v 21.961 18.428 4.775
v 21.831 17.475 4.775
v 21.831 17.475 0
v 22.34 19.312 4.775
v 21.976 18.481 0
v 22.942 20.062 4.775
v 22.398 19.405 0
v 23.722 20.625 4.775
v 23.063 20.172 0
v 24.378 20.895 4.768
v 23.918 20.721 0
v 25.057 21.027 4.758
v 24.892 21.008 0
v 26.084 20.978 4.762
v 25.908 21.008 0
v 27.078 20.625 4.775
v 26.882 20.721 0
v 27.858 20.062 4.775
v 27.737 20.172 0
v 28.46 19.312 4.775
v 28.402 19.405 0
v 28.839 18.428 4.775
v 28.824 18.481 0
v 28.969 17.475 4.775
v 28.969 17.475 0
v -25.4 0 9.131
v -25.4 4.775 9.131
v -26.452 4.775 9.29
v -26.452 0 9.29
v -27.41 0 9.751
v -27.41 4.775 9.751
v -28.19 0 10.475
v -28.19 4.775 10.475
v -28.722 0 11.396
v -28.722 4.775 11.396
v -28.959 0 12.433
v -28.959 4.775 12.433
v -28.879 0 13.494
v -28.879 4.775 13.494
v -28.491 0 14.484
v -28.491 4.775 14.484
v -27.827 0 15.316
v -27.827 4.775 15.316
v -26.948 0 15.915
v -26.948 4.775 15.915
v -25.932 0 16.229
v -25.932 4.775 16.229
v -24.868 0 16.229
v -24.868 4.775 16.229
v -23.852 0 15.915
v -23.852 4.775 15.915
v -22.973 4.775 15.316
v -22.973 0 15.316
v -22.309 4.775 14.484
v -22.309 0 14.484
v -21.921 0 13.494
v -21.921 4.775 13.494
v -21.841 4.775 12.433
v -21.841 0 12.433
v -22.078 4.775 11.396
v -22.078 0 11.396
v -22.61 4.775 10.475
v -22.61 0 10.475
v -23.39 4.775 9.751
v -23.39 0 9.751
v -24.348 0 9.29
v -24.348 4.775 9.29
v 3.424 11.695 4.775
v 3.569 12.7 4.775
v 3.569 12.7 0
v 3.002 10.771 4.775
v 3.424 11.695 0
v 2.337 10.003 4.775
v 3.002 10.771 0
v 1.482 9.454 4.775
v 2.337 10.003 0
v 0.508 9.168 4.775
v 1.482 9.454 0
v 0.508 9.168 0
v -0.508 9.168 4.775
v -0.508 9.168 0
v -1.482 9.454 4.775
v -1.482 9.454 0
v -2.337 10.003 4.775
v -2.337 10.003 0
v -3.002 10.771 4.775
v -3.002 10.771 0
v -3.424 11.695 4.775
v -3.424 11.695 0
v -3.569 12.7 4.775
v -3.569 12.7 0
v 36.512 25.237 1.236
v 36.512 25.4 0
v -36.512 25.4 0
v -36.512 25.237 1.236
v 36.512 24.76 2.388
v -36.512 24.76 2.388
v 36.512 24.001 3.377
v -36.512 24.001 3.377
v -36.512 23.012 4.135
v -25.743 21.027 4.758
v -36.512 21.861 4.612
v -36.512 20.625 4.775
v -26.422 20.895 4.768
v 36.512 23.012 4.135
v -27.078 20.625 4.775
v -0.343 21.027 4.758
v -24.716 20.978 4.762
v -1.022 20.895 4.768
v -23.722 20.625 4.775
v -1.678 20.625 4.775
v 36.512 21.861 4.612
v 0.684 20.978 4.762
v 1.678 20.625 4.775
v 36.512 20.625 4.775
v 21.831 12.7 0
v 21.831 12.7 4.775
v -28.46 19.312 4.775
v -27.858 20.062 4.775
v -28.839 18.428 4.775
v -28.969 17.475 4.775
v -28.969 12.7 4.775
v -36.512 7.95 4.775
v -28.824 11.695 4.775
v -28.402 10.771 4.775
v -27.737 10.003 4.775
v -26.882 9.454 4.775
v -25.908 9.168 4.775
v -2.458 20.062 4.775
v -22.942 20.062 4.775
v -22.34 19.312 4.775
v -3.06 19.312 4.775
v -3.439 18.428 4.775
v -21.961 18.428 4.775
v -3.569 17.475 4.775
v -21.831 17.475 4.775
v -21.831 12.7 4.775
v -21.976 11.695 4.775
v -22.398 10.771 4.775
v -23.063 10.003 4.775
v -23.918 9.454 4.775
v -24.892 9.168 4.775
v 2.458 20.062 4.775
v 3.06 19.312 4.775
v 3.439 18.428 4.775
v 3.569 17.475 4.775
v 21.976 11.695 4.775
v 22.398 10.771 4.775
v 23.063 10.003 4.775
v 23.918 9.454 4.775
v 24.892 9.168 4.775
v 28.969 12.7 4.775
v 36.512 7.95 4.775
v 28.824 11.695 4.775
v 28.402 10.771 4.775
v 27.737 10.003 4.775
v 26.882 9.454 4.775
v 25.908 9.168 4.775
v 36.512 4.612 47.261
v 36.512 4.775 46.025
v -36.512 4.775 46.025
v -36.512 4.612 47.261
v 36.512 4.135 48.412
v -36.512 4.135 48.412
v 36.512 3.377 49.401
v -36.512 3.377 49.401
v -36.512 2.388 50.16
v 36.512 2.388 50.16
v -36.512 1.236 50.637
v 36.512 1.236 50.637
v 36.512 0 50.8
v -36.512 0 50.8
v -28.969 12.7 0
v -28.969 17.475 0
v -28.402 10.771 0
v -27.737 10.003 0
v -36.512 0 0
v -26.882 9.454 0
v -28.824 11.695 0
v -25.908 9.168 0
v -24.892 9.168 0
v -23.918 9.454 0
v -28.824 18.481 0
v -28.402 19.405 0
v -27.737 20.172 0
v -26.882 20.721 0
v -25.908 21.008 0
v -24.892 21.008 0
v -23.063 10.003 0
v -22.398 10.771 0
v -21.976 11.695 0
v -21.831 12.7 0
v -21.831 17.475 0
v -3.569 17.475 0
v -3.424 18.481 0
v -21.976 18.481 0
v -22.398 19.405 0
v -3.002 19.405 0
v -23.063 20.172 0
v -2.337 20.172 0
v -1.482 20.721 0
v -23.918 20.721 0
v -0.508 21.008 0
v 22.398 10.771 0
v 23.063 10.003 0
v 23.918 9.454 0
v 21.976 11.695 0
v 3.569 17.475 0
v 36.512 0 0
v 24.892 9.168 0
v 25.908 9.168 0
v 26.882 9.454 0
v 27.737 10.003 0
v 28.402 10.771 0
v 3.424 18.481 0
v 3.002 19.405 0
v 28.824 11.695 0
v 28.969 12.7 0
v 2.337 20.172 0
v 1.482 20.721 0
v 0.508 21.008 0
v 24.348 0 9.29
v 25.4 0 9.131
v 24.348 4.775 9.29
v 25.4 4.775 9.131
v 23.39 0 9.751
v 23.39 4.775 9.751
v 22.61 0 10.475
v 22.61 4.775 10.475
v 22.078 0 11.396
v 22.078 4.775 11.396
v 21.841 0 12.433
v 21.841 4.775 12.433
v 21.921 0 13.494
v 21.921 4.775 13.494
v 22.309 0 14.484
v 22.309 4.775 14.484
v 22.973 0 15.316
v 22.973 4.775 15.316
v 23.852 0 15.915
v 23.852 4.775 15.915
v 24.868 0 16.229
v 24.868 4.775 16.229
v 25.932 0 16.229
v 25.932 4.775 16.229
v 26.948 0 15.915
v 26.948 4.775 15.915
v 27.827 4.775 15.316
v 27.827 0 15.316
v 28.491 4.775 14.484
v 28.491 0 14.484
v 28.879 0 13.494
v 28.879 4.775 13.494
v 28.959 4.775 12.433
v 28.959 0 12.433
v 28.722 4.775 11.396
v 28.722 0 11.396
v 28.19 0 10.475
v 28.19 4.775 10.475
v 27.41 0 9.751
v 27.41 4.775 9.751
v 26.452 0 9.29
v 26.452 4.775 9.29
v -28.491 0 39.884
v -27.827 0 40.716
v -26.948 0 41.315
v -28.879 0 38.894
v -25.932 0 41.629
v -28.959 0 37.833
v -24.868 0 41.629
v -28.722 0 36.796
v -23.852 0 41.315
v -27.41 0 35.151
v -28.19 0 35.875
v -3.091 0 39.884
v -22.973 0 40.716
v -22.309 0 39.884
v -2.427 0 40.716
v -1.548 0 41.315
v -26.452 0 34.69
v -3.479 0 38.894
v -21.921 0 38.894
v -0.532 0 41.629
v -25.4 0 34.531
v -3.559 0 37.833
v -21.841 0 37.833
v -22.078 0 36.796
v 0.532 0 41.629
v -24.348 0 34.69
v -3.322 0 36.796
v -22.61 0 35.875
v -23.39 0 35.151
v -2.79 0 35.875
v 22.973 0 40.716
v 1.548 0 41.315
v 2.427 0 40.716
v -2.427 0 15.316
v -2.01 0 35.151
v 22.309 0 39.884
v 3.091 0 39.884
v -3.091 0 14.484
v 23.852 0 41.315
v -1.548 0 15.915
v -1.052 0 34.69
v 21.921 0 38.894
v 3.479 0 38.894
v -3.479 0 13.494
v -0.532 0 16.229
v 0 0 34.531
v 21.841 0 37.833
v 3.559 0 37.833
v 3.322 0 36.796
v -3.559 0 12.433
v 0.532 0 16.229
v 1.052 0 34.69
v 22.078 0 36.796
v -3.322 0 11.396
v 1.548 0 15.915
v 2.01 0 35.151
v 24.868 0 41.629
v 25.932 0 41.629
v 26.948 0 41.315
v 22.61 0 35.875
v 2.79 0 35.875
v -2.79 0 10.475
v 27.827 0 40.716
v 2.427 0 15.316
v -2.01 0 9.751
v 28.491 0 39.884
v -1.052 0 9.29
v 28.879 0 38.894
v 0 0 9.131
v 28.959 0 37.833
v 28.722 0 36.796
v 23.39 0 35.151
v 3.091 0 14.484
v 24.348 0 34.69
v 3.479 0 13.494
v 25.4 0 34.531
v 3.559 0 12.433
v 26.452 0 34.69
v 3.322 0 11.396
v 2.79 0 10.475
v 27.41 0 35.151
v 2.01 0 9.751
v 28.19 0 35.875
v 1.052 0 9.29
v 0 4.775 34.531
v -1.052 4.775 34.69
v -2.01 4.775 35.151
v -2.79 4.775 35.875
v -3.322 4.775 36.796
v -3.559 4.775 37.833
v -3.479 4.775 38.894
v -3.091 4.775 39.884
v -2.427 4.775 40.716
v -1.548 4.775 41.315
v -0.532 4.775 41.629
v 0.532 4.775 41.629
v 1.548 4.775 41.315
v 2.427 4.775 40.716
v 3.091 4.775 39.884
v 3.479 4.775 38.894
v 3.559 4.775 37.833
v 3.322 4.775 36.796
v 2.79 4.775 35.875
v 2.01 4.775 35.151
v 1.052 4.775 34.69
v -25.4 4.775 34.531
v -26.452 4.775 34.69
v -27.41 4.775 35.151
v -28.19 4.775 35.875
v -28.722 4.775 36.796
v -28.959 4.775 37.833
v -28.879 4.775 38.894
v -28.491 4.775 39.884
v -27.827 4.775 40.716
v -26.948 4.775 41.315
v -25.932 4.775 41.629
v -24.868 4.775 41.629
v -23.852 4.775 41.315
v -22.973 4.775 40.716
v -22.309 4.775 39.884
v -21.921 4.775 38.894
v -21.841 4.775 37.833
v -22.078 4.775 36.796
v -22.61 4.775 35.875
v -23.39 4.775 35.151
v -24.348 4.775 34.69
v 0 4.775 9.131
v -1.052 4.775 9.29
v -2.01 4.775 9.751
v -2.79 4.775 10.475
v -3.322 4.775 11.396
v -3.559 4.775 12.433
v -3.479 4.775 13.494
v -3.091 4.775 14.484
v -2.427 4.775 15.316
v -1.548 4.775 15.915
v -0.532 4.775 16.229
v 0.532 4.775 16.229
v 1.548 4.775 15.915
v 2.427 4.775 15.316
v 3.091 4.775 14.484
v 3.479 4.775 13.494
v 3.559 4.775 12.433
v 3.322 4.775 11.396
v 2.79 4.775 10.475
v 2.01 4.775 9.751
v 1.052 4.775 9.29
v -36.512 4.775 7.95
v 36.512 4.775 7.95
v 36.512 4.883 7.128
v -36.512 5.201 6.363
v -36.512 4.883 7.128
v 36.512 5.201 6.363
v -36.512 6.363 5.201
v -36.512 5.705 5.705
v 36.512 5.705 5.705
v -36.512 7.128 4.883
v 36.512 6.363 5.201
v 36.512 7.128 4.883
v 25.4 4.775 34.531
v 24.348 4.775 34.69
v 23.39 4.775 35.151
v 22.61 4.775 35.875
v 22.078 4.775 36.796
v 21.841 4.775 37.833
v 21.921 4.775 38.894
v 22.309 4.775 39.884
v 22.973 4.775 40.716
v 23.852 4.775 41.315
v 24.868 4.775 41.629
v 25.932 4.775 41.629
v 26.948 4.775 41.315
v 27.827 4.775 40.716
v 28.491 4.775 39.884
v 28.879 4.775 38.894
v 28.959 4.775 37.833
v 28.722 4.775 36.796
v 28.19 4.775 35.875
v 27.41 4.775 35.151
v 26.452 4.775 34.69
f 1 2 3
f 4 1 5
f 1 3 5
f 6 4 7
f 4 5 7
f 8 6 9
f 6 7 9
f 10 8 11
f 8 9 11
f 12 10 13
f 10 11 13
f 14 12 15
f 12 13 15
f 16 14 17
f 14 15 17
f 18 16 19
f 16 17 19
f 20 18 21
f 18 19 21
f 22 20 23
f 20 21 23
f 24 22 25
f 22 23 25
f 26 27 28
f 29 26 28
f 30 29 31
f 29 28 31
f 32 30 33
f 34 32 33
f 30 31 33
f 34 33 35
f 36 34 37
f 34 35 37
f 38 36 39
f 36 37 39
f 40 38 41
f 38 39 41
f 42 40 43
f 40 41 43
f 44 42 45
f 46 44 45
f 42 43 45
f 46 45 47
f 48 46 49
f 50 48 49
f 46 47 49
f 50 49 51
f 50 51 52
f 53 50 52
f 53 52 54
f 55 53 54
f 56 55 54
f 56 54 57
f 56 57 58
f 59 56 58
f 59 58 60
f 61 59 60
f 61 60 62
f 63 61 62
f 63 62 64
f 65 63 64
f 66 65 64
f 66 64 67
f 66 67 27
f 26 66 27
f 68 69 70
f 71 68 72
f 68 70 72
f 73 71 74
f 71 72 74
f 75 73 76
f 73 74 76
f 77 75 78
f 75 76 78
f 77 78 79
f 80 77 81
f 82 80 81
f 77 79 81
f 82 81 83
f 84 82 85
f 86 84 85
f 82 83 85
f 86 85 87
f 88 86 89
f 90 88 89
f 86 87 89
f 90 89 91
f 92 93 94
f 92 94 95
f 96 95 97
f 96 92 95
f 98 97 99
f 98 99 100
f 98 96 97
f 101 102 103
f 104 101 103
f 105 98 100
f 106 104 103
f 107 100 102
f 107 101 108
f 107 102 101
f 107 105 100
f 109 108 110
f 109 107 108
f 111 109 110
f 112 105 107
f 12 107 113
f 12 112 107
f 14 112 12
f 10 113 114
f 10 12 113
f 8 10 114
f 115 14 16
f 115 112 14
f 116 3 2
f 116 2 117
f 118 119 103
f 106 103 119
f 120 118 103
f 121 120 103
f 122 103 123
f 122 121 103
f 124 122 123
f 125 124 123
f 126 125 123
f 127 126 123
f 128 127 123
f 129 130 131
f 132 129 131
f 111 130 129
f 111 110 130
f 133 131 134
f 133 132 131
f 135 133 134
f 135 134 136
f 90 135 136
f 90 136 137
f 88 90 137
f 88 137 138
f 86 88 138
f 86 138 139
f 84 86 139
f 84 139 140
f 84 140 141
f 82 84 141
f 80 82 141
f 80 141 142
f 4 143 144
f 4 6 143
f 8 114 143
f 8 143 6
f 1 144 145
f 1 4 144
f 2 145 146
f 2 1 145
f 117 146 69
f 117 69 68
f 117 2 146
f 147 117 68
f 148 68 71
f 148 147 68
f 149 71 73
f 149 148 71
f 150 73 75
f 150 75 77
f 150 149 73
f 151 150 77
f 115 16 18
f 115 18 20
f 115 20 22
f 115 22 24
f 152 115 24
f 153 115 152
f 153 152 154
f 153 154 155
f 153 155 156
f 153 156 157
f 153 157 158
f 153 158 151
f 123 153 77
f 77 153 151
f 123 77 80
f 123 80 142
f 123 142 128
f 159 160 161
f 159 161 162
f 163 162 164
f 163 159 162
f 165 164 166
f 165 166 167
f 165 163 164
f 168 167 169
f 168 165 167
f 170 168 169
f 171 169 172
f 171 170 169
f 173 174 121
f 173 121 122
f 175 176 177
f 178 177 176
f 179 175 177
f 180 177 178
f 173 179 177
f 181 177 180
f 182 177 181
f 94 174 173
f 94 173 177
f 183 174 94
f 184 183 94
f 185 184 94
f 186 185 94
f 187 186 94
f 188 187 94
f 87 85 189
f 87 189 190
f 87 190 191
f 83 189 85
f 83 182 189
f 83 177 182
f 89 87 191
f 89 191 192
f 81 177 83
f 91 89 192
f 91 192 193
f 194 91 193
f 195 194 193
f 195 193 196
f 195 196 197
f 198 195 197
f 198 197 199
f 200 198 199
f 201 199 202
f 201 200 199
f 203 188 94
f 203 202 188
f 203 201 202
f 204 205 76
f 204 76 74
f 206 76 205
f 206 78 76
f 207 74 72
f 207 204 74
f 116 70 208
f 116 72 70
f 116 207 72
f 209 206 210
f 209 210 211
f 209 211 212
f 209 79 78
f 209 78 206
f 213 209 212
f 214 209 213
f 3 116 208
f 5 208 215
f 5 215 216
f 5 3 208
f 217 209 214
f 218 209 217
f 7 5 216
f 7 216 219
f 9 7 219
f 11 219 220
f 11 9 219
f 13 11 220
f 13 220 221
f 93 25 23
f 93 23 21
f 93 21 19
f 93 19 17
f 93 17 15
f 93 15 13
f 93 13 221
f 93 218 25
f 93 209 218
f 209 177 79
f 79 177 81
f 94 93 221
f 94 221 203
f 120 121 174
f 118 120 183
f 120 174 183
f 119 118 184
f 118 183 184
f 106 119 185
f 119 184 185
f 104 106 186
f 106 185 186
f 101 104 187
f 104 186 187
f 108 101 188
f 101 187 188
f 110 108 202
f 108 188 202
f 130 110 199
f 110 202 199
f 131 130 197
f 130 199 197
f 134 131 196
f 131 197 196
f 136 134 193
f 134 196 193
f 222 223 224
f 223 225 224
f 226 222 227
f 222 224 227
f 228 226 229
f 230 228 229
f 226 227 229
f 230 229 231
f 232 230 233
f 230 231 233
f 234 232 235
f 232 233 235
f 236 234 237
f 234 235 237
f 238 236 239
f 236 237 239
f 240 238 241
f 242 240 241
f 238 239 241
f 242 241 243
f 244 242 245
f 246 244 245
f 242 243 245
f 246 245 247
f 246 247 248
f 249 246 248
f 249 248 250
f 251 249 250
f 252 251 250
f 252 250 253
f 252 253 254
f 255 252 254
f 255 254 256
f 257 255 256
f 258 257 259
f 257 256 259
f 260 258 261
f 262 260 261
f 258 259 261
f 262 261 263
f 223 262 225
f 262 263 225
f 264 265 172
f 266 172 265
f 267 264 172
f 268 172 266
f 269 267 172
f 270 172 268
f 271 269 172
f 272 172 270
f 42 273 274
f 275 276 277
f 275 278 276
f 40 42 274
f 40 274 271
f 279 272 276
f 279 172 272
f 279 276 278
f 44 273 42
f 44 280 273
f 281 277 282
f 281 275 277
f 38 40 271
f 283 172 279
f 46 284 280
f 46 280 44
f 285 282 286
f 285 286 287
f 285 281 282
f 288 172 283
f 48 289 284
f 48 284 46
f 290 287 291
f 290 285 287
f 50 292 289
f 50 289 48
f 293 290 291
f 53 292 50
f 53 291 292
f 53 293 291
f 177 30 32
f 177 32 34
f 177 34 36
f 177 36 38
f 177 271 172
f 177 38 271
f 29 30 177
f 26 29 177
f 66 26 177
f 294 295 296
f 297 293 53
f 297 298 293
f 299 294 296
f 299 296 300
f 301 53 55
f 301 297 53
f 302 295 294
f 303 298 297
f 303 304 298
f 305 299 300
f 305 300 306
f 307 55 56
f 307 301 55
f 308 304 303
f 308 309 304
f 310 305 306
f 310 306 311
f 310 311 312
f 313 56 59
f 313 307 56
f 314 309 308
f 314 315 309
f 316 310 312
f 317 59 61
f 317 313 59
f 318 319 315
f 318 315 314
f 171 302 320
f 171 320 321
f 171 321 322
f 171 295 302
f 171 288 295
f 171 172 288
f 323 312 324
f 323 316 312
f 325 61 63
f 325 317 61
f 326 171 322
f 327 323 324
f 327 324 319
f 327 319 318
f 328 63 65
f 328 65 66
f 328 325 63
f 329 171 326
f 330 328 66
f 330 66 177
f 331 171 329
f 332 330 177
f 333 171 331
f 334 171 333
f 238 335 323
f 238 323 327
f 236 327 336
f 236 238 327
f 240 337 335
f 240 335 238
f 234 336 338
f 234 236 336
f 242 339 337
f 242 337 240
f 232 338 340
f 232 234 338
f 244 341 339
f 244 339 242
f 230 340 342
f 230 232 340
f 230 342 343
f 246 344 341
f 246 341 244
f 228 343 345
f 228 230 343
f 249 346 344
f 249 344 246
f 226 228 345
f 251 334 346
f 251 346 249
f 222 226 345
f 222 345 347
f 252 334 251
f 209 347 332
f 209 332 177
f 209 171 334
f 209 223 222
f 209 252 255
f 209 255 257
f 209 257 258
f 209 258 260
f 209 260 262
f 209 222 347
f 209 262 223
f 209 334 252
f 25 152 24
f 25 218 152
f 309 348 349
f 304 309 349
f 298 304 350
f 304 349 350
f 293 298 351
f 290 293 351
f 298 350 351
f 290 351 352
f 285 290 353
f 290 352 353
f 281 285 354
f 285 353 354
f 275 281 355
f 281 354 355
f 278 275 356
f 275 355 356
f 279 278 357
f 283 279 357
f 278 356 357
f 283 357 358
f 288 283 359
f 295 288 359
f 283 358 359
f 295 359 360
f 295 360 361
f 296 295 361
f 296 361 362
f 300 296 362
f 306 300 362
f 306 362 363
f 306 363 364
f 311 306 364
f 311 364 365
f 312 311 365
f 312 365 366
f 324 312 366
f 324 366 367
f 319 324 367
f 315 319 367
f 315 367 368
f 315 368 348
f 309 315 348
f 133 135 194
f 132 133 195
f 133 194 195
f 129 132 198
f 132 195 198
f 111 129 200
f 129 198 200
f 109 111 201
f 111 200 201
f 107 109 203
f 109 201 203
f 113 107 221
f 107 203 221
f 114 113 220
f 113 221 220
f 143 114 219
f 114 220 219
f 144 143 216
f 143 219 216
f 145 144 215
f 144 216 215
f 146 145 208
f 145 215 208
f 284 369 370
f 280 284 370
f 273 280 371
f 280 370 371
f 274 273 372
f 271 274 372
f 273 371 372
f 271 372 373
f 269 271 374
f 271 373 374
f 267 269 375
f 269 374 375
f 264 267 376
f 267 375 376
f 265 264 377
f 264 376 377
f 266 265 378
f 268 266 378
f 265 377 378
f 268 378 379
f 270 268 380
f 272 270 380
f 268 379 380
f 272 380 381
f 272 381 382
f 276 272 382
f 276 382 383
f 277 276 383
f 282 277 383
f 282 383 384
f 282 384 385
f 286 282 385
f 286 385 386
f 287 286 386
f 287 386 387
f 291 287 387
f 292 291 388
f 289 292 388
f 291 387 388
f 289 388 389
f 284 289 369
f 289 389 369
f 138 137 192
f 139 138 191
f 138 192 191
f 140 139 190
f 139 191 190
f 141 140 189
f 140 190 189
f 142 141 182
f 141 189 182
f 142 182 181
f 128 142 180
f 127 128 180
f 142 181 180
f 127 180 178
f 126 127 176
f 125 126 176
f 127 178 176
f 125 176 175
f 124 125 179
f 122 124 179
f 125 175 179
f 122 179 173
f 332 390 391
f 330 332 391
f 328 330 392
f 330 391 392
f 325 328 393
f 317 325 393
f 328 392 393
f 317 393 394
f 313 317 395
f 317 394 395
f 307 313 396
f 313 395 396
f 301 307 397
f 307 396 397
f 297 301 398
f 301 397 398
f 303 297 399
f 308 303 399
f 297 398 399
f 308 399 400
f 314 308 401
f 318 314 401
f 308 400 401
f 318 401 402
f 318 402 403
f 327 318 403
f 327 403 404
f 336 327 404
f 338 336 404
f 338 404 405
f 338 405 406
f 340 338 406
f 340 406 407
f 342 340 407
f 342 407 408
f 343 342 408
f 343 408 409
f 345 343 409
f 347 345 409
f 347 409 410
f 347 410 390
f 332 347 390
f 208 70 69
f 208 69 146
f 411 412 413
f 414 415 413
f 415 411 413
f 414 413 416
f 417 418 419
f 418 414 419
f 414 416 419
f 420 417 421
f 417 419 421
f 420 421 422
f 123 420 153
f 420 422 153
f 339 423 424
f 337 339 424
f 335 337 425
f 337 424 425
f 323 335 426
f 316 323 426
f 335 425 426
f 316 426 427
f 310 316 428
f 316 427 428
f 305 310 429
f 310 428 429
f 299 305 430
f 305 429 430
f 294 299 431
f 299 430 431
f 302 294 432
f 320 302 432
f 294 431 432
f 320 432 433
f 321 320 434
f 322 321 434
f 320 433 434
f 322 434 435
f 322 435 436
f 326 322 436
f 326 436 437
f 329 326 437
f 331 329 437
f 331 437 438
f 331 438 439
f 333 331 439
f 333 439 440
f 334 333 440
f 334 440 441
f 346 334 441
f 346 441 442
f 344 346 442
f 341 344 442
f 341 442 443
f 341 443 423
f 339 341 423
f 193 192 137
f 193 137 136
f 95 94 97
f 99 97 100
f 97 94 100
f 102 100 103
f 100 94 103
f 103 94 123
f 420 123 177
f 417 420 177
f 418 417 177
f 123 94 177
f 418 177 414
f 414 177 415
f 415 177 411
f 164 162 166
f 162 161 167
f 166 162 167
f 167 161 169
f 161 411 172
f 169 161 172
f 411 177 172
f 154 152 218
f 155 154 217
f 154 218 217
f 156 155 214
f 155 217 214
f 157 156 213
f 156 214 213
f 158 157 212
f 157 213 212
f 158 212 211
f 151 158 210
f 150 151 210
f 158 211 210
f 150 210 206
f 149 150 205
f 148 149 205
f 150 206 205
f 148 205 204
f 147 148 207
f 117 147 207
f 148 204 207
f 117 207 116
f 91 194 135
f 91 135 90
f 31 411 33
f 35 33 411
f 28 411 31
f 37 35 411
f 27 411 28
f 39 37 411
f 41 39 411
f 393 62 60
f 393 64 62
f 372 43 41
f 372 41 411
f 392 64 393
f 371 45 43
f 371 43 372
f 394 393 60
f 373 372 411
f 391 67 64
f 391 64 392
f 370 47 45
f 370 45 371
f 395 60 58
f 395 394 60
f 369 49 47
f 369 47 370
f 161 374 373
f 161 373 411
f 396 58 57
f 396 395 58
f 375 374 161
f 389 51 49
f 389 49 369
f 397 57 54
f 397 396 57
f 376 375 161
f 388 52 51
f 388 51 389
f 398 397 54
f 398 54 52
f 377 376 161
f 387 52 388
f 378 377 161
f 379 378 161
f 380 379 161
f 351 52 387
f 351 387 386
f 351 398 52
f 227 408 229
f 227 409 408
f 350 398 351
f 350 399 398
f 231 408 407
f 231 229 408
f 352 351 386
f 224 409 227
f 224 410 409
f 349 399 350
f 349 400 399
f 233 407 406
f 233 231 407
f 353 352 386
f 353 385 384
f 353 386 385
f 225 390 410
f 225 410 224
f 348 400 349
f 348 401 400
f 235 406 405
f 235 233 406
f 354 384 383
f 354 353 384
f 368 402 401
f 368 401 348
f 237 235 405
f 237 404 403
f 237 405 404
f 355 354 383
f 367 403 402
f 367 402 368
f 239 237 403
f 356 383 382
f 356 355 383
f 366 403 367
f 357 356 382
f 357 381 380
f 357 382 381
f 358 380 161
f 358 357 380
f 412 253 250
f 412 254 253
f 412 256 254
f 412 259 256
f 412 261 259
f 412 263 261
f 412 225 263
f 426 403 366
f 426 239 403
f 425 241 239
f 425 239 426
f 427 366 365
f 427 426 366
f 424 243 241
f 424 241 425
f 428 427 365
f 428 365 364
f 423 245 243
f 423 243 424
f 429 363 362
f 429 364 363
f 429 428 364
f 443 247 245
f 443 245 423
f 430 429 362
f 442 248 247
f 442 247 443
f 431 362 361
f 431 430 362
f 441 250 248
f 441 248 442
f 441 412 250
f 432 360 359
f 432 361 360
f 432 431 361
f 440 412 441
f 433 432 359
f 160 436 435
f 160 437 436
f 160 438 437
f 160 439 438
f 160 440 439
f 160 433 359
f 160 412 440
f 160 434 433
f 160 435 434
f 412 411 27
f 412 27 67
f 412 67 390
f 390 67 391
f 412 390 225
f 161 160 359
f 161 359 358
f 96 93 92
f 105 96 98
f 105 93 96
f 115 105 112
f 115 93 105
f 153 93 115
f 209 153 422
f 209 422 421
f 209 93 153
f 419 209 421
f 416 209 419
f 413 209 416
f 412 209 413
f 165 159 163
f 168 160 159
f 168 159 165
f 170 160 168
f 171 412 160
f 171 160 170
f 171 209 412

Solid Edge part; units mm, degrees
sketch "Sketch1" plane through (0, 0, 0) normal (1, 0, 0) x (0, 1, 0)
  line L0 (0, 50.8) -> (0, 0)
  line L1 (0, 0) -> (25.4, 0)
  arc A0 (25.4, 0) -> (20.6248, 4.7752) centre (20.6248, 0) ccw
  line L2 (20.6248, 4.7752) -> (7.9502, 4.7752)
  arc A1 (7.9502, 4.7752) -> (4.7752, 7.9502) centre (7.9502, 7.9502) cw
  line L3 (4.7752, 7.9502) -> (4.7752, 46.0248)
  arc A2 (4.7752, 46.0248) -> (0, 50.8) centre (0, 46.0248) ccw
extrude "ExtrudedProtrusion_1" add sketch "Sketch1" against normal blind 36.5125 and the other way blind 36.5125
hole "Hole_1" at (25.4, 0, 12.7) direction (0, 1, 0) diameter 7.1374 depth 5.2527
hole "Hole_2" at (0, 0, 12.7) direction (0, 1, 0) diameter 7.1374 depth 5.2527
hole "Hole_3" at (-25.4, 0, 12.7) direction (0, 1, 0) diameter 7.1374 depth 5.2527
hole "Hole_4" at (25.4, 0, 38.1) direction (0, 1, 0) diameter 7.1374 depth 5.2527
hole "Hole_5" at (0, 0, 38.1) direction (0, 1, 0) diameter 7.1374 depth 5.2527
hole "Hole_6" at (-25.4, 0, 38.1) direction (0, 1, 0) diameter 7.1374 depth 5.2527
sketch "Sketch2" plane through (0, 0, 0) normal (0, 0, 1) x (1, 0, 0)
  arc A0 (21.8313, 12.7) -> (28.9687, 12.7) centre (25.4, 12.7) ccw
  line L0 (28.9687, 12.7) -> (28.9687, 17.4752)
  arc A1 (28.9687, 17.4752) -> (21.8313, 17.4752) centre (25.4, 17.4752) ccw
  line L1 (21.8313, 17.4752) -> (21.8313, 12.7)
extrude "ExtrudedCutout_1" cut sketch "Sketch2" along normal blind 7.1628
sketch "Sketch3" plane through (0, 0, 0) normal (0, 0, 1) x (1, 0, 0)
  arc A0 (-3.5687, 12.7) -> (3.5687, 12.7) centre (0, 12.7) ccw
  line L0 (3.5687, 12.7) -> (3.5687, 17.4752)
  arc A1 (3.5687, 17.4752) -> (-3.5687, 17.4752) centre (0, 17.4752) ccw
  line L1 (-3.5687, 17.4752) -> (-3.5687, 12.7)
extrude "ExtrudedCutout_2" cut sketch "Sketch3" along normal blind 7.1628
sketch "Sketch4" plane through (0, 0, 0) normal (0, 0, 1) x (1, 0, 0)
  arc A0 (-28.9687, 12.7) -> (-21.8313, 12.7) centre (-25.4, 12.7) ccw
  line L0 (-21.8313, 12.7) -> (-21.8313, 17.4752)
  arc A1 (-21.8313, 17.4752) -> (-28.9687, 17.4752) centre (-25.4, 17.4752) ccw
  line L1 (-28.9687, 17.4752) -> (-28.9687, 12.7)
extrude "ExtrudedCutout_3" cut sketch "Sketch4" along normal blind 7.1628
properties part number "4251"
